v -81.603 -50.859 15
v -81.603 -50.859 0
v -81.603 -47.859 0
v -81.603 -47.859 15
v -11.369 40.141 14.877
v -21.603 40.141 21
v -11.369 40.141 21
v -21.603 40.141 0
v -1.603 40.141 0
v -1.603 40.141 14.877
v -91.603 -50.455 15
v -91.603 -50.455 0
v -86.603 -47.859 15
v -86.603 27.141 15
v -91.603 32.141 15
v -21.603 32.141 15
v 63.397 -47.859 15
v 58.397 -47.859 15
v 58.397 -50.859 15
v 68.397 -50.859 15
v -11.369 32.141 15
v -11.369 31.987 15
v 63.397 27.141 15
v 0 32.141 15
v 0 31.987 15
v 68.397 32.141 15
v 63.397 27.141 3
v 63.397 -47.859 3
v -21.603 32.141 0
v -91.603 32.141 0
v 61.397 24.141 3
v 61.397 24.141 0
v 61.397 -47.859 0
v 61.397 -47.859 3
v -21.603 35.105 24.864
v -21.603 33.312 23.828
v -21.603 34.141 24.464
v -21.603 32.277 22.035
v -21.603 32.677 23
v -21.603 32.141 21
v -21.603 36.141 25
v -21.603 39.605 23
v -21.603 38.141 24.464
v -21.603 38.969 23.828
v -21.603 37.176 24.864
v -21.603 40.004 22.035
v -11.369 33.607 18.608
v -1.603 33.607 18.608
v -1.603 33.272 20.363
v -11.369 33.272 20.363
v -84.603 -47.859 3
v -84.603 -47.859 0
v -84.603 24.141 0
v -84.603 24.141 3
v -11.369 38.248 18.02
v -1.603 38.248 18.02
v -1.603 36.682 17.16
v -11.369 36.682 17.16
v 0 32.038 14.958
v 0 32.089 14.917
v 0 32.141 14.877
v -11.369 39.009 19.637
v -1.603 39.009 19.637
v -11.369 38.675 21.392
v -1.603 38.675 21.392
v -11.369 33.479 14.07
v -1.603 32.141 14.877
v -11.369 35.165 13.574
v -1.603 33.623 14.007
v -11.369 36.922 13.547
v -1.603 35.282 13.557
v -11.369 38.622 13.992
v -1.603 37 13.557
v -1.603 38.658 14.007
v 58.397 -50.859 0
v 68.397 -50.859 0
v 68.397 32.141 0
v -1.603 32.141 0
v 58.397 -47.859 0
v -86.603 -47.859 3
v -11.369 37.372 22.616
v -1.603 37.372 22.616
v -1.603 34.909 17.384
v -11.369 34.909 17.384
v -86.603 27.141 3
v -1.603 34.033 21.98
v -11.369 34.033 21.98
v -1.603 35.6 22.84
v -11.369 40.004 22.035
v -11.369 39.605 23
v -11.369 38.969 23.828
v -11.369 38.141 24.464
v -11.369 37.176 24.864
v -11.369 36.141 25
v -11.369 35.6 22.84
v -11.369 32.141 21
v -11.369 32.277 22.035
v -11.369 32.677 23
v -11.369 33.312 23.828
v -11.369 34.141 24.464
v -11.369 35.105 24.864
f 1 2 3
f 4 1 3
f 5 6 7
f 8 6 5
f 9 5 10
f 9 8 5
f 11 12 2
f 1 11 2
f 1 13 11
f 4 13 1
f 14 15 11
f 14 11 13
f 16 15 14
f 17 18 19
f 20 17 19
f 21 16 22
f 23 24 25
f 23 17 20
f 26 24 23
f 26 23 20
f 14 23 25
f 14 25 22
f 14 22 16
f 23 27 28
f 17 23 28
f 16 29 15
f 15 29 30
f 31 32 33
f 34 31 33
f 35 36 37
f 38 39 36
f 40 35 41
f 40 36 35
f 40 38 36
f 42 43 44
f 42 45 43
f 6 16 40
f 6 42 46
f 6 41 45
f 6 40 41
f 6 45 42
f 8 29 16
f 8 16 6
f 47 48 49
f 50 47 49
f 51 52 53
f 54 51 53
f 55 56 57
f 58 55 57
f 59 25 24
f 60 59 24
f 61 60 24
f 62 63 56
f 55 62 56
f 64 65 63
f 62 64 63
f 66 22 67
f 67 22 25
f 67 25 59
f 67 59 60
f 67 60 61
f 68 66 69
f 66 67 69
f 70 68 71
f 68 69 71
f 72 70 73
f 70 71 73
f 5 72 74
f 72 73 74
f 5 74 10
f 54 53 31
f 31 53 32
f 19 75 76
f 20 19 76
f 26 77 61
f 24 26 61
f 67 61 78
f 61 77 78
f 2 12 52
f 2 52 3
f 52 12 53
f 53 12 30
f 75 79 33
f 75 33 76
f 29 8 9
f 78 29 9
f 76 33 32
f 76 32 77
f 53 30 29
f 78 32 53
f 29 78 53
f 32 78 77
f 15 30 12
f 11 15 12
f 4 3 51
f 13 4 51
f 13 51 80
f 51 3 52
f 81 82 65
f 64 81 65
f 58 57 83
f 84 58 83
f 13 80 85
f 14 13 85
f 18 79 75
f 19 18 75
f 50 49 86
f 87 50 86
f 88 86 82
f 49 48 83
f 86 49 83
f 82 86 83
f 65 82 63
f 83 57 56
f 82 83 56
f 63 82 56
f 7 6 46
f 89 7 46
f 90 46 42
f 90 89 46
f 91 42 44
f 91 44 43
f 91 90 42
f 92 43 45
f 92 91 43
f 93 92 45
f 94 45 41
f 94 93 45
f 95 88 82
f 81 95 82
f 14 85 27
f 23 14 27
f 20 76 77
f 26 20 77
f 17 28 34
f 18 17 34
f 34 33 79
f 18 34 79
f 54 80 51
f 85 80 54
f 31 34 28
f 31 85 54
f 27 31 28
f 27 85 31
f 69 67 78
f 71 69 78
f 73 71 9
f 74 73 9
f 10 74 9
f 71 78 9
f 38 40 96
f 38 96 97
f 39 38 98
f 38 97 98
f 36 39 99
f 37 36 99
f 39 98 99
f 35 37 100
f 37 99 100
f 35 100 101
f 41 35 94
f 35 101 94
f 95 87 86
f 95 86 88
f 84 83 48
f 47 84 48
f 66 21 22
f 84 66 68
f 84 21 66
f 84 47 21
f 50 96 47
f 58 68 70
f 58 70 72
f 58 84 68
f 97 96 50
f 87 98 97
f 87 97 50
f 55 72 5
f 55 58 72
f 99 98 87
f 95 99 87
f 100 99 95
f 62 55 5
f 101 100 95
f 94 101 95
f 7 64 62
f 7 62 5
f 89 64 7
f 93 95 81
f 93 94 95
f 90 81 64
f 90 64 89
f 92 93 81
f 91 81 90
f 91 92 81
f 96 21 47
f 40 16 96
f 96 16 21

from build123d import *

# Parameters (mm, degrees)
F1_DEPTH = 15
F2_DEPTH = 3
F0_W     = 146
F0_H     = 3
F3_DEPTH = 3
F0_W_2   = 20
F0_H_2   = 8
F4_DEPTH = 25
F5_R     = 6.5
F6_DEPTH = 11.3693
F7_R     = 3.99999


# Not quite as in the source:
# - a fillet or chamfer is up to 0.001 mm smaller than in the source, because OpenCascade refuses the exact size


with BuildPart() as f1:
    # F0 (on Top) → F1 (new body)
    with BuildSketch(Plane.XY):
        Polygon((-21.6026537657, 32.1407727134), (-91.6026537657, 32.1407727134), (-91.6026537657, -50.4549115884), (-81.6026537657, -50.8592272866), (-81.6026537657, -47.8592272866), (-84.6026537657, -47.8592272866), (-86.6026537657, -47.8592272866), (-86.6026537657, 27.1407727134), (-84.6026537657, 27.1407727134), (61.3973462343, 27.1407727134), (63.3973462343, 27.1407727134), (63.3973462343, -47.8592272866), (61.3973462343, -47.8592272866), (58.3973462343, -47.8592272866), (58.3973462343, -50.8592272866), (68.3973462343, -50.8592272866), (68.3973462343, 32.1407727134), (-1.6026537657, 32.1407727134), align=None)
    extrude(amount=F1_DEPTH)

    # F0 (on Top) → F2 (join)
    with BuildSketch(Plane.XY):
        Polygon((-86.6026537657, -47.8592272866), (-84.6026537657, -47.8592272866), (-84.6026537657, 24.1407727134), (-84.6026537657, 27.1407727134), (-86.6026537657, 27.1407727134), align=None)
        Polygon((61.3973462343, 27.1407727134), (61.3973462343, 24.1407727134), (61.3973462343, -47.8592272866), (63.3973462343, -47.8592272866), (63.3973462343, 27.1407727134), align=None)
    extrude(amount=F2_DEPTH)

    # F0 (on Top) → F3 (join)
    with BuildSketch(Plane.XY):
        with Locations((-11.6026537657, 25.6407727134)):
            Rectangle(F0_W, F0_H)
    extrude(amount=F3_DEPTH)

    # F0 (on Top) → F4 (join)
    with BuildSketch(Plane.XY):
        with Locations((-11.6026537657, 36.1407727134)):
            Rectangle(F0_W_2, F0_H_2)
    extrude(amount=F4_DEPTH)

    # F5 (on Right) → F6 (cut)
    with BuildSketch(Plane.YZ):
        with Locations((36.1407727134, 20)):
            Circle(F5_R)
        Polygon((33.2721245414, 20.362976629), (34.0333399009, 21.979803351), (35.5995229657, 22.8404124839), (37.3724450378, 22.61608059), (38.674910145, 21.3924948281), (39.0094208855, 19.637023371), (38.248205526, 18.020196649), (36.6820224612, 17.1595875161), (34.9091003891, 17.38391941), (33.6066352819, 18.6075051719), align=None, mode=Mode.SUBTRACT)
    extrude(amount=-F6_DEPTH, mode=Mode.SUBTRACT)

    # F7 (radius 4 in the source; OpenCascade refuses exactly that, so slightly less here)
    f7_edges = [f1.edges().sort_by_distance(p)[0] for p in [
        (-16.485977, 40.140773, 25),
        (-16.485977, 32.140773, 25),
    ]]
    fillet(f7_edges, radius=F7_R)


solid = f1.part
